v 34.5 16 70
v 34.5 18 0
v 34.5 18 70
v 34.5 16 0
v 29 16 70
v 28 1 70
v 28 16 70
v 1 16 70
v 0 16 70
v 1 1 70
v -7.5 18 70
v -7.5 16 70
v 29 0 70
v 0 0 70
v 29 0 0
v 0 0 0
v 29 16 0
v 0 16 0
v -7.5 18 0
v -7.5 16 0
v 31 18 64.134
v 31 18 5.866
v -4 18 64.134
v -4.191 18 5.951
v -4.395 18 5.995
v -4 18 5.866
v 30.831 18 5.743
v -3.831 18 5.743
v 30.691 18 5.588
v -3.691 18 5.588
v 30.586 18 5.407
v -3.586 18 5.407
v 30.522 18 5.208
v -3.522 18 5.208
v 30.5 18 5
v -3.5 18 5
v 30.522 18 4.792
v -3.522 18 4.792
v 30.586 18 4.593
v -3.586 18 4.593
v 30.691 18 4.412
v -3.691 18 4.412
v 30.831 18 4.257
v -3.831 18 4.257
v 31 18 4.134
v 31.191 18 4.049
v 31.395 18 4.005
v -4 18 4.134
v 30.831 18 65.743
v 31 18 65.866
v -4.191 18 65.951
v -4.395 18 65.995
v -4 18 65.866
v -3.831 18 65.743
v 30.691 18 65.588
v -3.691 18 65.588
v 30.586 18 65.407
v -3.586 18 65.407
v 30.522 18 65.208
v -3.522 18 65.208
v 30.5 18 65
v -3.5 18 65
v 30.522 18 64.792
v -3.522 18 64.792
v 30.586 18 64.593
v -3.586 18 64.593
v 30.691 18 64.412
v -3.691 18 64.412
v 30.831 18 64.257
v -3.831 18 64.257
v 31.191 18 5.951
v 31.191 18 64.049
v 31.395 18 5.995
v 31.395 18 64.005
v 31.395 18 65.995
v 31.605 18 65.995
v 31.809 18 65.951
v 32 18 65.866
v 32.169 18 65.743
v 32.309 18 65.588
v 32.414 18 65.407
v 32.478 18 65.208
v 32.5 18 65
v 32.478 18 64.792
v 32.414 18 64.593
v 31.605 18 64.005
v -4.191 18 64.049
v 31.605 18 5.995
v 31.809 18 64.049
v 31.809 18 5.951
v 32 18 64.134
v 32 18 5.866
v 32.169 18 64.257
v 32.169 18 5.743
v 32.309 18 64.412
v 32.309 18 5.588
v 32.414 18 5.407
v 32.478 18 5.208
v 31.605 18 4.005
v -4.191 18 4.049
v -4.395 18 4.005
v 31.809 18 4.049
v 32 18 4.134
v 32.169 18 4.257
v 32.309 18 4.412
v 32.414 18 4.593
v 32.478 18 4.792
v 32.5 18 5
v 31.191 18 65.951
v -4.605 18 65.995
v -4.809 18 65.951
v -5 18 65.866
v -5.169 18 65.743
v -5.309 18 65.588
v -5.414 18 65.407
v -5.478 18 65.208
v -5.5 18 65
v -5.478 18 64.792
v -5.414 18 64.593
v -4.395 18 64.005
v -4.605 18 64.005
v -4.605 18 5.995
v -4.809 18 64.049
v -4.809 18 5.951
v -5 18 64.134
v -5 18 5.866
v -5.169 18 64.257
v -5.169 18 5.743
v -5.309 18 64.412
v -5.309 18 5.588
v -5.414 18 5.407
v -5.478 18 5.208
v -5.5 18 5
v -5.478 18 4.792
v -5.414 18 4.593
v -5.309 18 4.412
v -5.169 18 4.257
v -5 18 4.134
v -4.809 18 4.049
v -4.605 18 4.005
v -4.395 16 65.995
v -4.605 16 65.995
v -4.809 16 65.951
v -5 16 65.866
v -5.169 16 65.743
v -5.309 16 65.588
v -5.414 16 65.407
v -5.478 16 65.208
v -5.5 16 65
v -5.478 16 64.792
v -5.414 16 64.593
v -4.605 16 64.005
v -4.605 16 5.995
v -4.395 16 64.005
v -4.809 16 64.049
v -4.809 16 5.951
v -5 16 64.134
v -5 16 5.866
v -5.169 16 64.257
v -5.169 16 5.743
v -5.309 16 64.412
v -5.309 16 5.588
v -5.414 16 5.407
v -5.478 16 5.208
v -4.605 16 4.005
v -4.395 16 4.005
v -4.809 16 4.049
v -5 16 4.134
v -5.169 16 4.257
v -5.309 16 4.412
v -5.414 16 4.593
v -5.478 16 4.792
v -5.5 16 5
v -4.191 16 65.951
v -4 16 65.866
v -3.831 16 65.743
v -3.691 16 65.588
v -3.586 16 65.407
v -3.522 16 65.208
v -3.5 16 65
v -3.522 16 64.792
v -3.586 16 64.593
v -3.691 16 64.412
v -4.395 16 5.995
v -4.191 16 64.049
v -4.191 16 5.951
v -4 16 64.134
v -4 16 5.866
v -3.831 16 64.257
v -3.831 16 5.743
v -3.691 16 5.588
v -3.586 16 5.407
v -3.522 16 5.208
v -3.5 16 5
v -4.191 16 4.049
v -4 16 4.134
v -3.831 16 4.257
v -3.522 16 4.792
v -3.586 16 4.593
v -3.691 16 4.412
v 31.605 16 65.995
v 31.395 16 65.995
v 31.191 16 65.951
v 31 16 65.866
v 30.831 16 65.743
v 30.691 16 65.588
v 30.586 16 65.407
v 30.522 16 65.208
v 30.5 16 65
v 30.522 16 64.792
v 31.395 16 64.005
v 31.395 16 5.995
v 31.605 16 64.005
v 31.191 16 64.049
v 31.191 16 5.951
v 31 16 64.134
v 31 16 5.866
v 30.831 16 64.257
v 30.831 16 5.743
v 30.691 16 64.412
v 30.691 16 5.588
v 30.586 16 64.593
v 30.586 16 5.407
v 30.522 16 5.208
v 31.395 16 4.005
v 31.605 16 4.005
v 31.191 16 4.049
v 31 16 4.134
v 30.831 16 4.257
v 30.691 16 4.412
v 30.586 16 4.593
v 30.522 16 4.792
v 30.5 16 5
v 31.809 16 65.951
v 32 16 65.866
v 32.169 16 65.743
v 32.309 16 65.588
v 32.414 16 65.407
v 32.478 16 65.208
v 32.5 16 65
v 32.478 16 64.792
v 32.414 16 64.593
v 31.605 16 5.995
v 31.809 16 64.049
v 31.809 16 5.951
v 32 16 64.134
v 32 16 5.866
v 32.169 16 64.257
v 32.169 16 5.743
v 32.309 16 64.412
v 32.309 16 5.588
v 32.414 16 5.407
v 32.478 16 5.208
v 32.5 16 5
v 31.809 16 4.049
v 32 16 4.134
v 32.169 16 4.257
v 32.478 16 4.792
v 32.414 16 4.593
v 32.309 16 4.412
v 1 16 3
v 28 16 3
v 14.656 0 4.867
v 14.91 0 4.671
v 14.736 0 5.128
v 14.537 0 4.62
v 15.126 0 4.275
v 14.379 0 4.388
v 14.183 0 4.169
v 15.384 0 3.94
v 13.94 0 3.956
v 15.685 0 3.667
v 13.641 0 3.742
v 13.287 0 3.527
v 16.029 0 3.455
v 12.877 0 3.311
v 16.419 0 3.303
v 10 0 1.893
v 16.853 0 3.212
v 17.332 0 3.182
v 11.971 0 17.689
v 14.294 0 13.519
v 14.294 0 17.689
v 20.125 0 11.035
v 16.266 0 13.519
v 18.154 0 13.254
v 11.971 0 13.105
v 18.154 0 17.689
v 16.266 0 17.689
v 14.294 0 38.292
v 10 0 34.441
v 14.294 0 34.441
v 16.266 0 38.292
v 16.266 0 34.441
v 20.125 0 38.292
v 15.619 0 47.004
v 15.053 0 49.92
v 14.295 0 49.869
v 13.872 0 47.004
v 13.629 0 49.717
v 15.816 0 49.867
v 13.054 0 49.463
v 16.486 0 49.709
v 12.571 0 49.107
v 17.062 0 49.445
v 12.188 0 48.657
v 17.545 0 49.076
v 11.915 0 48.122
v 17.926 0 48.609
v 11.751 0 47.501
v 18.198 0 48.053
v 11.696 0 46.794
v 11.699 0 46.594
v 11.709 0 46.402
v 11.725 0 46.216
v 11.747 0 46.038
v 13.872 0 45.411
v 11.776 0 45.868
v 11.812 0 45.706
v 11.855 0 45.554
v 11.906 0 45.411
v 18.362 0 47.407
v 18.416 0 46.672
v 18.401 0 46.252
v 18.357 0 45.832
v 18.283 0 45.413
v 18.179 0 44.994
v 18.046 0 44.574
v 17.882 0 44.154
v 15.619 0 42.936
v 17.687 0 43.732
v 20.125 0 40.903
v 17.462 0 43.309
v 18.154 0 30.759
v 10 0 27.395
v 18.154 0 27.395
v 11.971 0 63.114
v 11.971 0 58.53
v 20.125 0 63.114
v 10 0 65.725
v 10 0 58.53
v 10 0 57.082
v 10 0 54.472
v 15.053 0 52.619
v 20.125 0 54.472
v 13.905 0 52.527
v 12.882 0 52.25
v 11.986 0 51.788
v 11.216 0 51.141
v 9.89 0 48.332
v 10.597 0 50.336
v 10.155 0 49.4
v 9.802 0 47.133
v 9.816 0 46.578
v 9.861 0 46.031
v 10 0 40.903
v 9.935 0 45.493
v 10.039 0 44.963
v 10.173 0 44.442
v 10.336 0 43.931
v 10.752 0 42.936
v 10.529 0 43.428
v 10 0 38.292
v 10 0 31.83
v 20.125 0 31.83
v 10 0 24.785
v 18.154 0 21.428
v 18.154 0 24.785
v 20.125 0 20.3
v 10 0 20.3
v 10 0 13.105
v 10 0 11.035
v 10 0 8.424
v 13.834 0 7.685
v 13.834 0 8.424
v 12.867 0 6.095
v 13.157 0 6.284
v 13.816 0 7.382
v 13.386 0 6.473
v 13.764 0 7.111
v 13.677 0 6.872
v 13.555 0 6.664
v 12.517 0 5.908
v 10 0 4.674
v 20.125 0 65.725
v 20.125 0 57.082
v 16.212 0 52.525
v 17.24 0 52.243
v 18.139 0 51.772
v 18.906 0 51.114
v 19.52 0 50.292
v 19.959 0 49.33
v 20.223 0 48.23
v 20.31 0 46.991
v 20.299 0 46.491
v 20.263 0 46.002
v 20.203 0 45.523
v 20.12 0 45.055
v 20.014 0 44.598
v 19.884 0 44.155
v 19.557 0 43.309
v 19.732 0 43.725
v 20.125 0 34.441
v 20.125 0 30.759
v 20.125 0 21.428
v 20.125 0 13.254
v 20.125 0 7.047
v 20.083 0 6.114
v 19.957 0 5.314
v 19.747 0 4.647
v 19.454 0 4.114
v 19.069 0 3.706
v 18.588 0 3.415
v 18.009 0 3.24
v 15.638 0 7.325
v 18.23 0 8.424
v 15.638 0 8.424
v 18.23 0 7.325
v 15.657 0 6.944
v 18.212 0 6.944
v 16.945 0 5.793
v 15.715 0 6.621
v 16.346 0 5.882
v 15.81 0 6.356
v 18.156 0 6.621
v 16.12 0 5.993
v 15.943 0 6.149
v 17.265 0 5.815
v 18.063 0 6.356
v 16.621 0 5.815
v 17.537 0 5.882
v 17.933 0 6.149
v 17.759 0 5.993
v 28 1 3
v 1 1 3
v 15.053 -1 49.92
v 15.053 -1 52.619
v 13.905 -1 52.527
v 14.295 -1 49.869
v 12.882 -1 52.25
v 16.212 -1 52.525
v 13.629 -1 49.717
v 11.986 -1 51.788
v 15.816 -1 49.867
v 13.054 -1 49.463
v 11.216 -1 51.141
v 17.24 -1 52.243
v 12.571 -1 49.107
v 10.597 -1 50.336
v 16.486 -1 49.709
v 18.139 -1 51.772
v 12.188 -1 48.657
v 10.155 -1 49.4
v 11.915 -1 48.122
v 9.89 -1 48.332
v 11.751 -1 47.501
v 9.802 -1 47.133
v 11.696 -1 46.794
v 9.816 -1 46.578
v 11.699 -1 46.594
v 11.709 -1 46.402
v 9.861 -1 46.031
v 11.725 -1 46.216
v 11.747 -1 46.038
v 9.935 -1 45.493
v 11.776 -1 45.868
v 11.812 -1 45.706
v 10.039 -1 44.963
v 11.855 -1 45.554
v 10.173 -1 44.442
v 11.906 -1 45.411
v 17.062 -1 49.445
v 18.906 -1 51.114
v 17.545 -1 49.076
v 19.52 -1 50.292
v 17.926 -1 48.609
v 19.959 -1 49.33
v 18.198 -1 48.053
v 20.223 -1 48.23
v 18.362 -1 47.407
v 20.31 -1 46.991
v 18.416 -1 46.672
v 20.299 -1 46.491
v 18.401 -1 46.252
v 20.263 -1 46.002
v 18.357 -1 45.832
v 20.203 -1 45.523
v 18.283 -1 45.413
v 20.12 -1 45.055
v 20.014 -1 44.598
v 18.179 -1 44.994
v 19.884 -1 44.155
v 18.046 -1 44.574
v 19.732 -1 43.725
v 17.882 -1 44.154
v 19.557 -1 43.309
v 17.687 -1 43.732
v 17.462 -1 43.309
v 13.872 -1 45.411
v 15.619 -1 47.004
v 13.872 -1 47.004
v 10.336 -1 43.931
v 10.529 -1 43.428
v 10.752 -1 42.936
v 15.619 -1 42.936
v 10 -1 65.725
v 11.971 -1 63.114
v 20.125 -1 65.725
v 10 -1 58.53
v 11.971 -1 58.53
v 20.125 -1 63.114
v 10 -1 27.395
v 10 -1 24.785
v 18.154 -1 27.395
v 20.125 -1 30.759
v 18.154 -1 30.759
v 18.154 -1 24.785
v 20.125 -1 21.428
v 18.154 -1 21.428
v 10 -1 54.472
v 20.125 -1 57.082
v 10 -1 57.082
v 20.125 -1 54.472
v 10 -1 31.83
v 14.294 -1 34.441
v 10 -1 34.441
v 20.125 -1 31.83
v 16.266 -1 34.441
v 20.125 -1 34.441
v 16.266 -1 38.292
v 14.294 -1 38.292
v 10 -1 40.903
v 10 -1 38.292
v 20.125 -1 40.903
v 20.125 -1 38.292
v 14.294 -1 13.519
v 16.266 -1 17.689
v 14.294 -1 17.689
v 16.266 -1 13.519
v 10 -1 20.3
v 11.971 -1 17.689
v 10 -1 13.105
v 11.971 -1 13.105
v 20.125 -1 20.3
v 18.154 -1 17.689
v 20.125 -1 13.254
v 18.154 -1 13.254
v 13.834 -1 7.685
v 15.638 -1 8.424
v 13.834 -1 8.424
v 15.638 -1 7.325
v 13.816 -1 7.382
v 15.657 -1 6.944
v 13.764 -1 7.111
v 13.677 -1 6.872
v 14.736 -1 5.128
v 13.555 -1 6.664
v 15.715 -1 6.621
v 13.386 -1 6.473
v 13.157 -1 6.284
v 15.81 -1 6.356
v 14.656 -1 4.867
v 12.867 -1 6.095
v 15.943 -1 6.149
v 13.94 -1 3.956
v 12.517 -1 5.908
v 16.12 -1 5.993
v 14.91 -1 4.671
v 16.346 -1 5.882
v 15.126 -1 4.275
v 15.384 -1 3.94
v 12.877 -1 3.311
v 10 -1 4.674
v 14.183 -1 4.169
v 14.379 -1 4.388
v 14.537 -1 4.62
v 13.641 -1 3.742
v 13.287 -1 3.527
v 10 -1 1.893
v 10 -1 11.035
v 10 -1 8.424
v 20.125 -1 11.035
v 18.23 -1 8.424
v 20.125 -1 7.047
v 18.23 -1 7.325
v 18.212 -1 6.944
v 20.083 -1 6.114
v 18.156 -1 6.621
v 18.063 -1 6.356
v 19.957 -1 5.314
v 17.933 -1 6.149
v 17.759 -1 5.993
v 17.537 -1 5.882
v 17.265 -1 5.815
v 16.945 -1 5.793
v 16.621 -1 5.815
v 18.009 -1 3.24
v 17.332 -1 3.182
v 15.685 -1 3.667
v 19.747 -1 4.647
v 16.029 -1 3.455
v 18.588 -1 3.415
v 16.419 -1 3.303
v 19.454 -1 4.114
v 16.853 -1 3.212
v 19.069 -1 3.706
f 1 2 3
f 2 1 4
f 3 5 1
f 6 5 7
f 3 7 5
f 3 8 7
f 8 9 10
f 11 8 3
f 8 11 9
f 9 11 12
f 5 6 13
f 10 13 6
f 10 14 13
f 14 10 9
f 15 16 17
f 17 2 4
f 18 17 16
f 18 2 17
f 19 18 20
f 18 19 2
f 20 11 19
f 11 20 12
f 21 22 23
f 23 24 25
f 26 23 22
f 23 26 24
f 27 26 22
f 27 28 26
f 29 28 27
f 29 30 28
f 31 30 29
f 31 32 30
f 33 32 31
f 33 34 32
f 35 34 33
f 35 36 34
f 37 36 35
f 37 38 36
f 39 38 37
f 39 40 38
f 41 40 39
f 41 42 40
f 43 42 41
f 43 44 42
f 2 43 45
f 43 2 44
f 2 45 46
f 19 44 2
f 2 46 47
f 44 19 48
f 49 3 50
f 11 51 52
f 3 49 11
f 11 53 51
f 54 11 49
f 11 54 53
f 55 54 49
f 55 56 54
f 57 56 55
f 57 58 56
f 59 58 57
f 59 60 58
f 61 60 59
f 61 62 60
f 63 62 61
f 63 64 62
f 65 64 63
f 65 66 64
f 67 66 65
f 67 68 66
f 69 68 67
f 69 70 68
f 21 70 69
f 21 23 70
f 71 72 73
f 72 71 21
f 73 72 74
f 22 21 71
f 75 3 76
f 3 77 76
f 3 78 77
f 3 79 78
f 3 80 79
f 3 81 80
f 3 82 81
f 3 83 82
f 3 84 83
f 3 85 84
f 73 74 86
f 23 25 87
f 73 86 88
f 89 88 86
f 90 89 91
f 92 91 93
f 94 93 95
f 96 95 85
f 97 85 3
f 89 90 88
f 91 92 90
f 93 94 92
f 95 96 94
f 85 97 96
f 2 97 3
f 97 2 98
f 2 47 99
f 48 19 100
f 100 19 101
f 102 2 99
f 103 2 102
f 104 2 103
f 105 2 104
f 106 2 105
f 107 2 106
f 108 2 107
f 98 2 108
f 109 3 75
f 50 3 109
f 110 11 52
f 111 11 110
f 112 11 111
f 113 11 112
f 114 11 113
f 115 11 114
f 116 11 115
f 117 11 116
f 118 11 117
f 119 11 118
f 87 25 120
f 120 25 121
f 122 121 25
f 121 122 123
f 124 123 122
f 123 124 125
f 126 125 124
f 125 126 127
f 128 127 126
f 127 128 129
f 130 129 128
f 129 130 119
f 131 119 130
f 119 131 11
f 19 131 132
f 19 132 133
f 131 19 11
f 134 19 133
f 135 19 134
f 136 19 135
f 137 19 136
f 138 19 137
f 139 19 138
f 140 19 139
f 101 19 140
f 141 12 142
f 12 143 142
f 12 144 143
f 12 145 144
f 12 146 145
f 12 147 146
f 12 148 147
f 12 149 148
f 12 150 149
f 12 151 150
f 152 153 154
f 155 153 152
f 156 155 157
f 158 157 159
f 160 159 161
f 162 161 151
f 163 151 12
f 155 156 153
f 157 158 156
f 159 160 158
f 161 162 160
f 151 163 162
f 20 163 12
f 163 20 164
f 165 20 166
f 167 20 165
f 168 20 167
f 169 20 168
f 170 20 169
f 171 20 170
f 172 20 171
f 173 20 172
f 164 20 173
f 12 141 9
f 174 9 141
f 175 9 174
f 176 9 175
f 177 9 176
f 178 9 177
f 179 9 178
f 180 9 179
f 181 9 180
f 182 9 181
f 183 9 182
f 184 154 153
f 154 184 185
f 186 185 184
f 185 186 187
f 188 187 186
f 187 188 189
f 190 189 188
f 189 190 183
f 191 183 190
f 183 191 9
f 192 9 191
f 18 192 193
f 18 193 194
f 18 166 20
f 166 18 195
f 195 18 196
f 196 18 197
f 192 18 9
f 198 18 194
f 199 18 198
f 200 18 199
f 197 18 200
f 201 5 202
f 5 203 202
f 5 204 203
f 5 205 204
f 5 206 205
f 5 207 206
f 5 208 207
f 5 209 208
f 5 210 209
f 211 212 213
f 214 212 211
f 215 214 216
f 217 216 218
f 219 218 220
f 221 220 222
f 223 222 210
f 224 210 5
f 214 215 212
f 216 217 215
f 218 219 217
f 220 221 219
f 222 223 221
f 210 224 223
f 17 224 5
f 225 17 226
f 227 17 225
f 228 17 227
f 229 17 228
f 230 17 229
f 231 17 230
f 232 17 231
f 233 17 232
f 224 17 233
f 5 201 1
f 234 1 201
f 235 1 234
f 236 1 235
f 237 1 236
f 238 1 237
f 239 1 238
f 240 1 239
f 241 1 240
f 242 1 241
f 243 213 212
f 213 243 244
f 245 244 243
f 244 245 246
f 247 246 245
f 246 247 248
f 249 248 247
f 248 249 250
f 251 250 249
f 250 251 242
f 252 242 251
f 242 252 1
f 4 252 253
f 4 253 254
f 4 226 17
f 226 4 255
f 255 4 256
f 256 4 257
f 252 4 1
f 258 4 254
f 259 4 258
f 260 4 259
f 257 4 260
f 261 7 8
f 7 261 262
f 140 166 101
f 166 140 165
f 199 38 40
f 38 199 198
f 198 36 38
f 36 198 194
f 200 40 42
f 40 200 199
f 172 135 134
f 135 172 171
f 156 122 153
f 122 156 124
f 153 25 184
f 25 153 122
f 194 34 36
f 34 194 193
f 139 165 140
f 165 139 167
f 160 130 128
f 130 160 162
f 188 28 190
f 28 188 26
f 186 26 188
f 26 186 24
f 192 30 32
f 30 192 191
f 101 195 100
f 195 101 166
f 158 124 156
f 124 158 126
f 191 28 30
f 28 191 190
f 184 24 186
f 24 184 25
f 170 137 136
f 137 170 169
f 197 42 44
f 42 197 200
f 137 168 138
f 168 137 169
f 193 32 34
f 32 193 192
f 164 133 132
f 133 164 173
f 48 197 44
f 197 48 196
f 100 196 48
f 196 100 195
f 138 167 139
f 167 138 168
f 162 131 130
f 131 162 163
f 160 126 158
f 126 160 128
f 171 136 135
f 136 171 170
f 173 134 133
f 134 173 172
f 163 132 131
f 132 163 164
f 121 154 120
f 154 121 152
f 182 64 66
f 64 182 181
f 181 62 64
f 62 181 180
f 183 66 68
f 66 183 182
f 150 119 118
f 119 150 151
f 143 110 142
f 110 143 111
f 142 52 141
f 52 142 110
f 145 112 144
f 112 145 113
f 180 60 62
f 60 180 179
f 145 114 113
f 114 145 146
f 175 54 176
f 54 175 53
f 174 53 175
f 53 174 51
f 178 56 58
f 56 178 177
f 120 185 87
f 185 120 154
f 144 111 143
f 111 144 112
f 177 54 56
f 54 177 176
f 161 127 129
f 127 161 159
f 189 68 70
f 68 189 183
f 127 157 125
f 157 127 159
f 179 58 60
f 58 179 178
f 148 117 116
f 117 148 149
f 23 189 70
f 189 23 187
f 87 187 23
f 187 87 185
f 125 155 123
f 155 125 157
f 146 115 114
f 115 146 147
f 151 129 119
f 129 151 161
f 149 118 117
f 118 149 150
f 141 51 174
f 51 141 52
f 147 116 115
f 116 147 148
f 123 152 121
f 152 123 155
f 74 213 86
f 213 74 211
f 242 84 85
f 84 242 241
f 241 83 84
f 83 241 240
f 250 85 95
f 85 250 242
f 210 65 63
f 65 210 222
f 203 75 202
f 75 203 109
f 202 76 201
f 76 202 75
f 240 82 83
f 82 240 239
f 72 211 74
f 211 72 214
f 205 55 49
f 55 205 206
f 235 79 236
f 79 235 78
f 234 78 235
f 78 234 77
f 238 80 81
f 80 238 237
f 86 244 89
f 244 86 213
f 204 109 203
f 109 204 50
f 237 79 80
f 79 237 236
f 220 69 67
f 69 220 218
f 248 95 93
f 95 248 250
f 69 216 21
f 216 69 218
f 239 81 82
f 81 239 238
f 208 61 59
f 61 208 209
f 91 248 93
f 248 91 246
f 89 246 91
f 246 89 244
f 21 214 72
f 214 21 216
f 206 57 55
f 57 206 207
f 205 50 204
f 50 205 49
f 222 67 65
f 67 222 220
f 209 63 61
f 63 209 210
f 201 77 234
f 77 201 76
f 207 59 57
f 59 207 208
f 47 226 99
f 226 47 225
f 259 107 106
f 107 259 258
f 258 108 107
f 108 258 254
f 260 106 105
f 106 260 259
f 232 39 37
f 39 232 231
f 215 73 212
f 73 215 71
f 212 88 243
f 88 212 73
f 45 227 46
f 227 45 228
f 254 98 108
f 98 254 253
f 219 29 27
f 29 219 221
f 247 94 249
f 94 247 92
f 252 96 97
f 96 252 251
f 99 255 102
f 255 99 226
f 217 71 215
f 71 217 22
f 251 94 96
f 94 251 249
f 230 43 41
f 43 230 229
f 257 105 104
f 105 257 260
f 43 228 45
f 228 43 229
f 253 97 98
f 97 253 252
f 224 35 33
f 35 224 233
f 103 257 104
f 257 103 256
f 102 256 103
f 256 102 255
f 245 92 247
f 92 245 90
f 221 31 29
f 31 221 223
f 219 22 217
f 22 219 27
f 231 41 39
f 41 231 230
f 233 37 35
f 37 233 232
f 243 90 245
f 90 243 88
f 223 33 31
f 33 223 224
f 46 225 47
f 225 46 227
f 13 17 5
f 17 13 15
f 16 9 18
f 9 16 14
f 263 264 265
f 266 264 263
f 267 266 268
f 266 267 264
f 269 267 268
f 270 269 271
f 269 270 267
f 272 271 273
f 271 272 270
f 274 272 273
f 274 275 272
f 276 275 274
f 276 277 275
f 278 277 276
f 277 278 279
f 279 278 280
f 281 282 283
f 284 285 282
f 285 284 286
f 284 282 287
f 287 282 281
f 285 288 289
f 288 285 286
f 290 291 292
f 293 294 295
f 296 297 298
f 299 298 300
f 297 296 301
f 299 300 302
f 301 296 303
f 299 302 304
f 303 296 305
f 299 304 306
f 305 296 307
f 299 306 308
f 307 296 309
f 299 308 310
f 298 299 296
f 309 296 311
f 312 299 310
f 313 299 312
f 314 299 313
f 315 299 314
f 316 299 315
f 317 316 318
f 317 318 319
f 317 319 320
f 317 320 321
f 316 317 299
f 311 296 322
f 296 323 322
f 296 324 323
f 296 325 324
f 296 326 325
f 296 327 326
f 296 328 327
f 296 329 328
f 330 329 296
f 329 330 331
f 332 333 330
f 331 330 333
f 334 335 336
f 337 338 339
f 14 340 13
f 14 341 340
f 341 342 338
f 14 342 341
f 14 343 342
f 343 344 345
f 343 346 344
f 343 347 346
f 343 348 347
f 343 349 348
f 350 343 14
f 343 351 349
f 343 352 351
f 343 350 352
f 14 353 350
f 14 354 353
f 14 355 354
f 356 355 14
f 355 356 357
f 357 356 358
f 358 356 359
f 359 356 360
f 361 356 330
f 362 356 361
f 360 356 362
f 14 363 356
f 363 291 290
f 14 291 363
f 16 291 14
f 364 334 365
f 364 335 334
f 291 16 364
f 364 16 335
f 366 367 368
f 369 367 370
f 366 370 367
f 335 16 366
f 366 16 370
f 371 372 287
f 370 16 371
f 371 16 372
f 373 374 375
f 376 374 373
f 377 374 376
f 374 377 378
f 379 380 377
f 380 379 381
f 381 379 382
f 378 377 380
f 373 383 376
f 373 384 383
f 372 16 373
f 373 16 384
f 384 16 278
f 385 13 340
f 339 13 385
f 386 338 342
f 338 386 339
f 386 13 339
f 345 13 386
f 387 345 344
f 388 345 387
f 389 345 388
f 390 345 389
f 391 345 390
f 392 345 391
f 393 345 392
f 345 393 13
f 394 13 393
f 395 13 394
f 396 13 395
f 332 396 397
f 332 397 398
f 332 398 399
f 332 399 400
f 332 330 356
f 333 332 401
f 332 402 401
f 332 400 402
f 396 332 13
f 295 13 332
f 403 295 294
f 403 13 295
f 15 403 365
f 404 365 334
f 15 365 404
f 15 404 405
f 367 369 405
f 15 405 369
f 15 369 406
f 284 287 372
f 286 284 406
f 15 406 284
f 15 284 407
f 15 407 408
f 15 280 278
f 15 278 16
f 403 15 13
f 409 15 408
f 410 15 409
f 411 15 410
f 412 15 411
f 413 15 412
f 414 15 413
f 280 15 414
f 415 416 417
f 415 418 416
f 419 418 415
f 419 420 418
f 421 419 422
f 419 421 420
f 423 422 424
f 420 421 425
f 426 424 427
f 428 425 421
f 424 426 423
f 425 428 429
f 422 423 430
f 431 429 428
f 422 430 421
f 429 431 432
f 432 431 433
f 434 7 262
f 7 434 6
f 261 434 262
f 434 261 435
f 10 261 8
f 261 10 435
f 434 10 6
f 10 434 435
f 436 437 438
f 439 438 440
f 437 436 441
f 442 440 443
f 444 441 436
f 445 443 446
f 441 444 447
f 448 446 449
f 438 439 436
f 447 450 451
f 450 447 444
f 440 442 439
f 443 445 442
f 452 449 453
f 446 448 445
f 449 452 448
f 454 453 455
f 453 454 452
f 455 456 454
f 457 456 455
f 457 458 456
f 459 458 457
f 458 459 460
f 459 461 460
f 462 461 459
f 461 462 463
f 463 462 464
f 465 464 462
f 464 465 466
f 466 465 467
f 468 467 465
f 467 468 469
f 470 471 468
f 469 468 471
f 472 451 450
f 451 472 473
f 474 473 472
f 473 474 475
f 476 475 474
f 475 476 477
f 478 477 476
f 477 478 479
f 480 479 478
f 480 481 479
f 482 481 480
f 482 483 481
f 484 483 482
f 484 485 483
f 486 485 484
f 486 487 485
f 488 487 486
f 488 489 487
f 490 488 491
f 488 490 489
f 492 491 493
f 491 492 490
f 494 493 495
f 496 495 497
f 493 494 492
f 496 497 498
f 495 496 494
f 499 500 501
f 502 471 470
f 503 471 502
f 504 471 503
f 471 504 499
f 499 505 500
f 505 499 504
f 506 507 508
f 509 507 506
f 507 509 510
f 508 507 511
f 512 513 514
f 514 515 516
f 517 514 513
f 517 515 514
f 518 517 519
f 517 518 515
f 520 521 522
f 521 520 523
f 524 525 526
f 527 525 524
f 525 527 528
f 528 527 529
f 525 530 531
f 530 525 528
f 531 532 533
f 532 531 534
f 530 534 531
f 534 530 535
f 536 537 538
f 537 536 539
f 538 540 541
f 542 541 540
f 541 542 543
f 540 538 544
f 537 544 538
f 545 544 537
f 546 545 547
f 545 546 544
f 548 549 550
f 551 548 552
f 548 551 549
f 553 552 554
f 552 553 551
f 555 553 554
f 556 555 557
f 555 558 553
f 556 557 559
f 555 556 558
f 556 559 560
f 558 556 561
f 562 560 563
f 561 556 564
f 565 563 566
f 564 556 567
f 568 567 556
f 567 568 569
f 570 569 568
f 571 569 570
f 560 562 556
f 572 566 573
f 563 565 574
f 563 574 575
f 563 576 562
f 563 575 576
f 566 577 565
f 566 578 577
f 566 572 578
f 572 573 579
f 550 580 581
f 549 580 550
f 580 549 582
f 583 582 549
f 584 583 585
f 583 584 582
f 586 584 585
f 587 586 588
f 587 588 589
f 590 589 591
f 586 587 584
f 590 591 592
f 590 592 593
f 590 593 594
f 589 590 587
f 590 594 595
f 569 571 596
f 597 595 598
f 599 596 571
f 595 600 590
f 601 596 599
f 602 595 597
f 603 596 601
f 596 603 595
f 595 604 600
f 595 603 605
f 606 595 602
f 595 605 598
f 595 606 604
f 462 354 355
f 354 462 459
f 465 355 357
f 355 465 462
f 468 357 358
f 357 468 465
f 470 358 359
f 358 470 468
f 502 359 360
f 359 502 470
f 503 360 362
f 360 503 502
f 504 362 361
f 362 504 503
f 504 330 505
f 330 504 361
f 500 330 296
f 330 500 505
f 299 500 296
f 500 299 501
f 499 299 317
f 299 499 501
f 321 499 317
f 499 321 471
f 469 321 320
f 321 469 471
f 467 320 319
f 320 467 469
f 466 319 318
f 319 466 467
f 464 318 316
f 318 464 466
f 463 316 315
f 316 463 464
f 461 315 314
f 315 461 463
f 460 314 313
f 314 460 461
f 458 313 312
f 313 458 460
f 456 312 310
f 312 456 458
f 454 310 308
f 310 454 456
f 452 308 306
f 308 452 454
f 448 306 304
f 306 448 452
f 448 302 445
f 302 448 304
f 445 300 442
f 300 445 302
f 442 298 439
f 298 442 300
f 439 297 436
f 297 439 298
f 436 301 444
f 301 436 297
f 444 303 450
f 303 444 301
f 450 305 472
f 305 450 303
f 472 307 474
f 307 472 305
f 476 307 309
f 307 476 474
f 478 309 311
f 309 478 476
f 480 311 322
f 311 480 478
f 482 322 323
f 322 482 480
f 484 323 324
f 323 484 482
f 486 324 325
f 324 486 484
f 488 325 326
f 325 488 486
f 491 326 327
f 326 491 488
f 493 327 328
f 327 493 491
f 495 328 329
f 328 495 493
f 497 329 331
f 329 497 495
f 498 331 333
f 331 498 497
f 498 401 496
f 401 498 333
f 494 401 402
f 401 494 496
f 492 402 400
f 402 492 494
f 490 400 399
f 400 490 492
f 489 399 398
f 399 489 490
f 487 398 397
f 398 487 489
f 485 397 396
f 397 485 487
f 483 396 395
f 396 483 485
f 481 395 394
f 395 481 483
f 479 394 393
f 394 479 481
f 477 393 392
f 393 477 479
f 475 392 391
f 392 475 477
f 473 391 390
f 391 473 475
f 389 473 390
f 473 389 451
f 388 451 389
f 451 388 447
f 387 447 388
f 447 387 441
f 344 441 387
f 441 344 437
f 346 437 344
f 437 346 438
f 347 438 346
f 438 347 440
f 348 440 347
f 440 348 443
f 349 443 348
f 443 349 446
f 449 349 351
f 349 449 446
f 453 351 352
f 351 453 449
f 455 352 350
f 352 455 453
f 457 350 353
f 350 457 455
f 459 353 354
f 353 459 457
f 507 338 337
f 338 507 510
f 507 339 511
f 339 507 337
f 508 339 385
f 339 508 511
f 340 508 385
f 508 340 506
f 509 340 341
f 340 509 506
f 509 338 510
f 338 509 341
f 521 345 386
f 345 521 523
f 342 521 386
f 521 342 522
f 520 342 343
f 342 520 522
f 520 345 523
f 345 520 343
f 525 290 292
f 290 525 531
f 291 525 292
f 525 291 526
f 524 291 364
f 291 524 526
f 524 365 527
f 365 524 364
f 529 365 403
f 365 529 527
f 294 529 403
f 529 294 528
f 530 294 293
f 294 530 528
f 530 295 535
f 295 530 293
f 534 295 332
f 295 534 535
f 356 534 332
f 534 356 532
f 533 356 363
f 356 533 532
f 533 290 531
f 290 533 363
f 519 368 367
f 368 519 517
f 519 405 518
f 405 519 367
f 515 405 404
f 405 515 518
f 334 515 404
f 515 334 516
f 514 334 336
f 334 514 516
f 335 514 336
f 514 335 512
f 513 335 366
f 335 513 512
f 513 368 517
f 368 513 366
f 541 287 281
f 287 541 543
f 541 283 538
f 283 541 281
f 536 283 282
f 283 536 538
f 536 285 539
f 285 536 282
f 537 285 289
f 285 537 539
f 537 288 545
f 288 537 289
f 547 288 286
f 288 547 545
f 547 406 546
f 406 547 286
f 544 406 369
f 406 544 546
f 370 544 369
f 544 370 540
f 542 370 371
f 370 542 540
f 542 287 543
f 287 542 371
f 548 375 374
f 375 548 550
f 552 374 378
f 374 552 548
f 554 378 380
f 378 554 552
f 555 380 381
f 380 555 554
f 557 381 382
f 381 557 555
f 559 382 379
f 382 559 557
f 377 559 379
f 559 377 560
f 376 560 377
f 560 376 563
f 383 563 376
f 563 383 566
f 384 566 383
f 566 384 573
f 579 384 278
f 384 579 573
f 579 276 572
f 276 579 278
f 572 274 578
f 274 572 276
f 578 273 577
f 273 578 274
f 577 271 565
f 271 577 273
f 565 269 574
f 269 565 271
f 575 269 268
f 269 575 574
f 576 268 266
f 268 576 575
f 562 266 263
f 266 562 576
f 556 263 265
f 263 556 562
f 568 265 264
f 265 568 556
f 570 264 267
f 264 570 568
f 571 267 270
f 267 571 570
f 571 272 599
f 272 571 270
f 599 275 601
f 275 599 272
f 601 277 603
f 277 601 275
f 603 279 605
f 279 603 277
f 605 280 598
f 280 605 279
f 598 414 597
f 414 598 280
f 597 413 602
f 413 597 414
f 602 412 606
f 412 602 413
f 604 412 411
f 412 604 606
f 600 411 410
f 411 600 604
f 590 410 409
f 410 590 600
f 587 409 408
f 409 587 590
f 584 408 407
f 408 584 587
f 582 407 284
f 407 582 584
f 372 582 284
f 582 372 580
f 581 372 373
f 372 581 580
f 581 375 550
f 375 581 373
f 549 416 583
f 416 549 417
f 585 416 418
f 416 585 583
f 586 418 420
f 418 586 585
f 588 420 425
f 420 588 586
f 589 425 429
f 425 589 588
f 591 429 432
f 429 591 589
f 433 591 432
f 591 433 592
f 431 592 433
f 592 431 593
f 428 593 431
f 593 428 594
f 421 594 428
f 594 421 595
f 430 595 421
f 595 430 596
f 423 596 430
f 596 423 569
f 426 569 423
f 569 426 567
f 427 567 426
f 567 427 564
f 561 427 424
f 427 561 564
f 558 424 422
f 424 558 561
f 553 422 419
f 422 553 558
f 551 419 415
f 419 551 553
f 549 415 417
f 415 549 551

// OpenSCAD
$fn=30;

tw= 27;
td=16;
ttd=18;
th=70;


    box();
    translate([10,0,th - 3])
    rotate([90,90,0])
    linear_extrude(height=1)
    text("LIGHTER", font = "FONTIN:style=Bold");


module box(){
union(){

translate([-(tw + 15-tw)/2,ttd-2,0])
difference(){
cube([tw + 15,2,th]);
    
    translate([3,0,5])
    rotate([-90,0,0])
    cylinder(r=1,h=4);
    
    translate([3,0,th-5])
    rotate([-90,0,0])
    cylinder(r=1,h=4);
    
    translate([tw + 15-3,0,th-5])
    rotate([-90,0,0])
    cylinder(r=1,h=4);
    
    translate([tw+ 15 -3,0,5])
    rotate([-90,0,0])
    cylinder(r=1,h=4);
    
    }
difference(){

//box
cube([tw+2,ttd,th]);    
translate([1,1,3])
cube([tw,td,th]);
    
}

}

}
